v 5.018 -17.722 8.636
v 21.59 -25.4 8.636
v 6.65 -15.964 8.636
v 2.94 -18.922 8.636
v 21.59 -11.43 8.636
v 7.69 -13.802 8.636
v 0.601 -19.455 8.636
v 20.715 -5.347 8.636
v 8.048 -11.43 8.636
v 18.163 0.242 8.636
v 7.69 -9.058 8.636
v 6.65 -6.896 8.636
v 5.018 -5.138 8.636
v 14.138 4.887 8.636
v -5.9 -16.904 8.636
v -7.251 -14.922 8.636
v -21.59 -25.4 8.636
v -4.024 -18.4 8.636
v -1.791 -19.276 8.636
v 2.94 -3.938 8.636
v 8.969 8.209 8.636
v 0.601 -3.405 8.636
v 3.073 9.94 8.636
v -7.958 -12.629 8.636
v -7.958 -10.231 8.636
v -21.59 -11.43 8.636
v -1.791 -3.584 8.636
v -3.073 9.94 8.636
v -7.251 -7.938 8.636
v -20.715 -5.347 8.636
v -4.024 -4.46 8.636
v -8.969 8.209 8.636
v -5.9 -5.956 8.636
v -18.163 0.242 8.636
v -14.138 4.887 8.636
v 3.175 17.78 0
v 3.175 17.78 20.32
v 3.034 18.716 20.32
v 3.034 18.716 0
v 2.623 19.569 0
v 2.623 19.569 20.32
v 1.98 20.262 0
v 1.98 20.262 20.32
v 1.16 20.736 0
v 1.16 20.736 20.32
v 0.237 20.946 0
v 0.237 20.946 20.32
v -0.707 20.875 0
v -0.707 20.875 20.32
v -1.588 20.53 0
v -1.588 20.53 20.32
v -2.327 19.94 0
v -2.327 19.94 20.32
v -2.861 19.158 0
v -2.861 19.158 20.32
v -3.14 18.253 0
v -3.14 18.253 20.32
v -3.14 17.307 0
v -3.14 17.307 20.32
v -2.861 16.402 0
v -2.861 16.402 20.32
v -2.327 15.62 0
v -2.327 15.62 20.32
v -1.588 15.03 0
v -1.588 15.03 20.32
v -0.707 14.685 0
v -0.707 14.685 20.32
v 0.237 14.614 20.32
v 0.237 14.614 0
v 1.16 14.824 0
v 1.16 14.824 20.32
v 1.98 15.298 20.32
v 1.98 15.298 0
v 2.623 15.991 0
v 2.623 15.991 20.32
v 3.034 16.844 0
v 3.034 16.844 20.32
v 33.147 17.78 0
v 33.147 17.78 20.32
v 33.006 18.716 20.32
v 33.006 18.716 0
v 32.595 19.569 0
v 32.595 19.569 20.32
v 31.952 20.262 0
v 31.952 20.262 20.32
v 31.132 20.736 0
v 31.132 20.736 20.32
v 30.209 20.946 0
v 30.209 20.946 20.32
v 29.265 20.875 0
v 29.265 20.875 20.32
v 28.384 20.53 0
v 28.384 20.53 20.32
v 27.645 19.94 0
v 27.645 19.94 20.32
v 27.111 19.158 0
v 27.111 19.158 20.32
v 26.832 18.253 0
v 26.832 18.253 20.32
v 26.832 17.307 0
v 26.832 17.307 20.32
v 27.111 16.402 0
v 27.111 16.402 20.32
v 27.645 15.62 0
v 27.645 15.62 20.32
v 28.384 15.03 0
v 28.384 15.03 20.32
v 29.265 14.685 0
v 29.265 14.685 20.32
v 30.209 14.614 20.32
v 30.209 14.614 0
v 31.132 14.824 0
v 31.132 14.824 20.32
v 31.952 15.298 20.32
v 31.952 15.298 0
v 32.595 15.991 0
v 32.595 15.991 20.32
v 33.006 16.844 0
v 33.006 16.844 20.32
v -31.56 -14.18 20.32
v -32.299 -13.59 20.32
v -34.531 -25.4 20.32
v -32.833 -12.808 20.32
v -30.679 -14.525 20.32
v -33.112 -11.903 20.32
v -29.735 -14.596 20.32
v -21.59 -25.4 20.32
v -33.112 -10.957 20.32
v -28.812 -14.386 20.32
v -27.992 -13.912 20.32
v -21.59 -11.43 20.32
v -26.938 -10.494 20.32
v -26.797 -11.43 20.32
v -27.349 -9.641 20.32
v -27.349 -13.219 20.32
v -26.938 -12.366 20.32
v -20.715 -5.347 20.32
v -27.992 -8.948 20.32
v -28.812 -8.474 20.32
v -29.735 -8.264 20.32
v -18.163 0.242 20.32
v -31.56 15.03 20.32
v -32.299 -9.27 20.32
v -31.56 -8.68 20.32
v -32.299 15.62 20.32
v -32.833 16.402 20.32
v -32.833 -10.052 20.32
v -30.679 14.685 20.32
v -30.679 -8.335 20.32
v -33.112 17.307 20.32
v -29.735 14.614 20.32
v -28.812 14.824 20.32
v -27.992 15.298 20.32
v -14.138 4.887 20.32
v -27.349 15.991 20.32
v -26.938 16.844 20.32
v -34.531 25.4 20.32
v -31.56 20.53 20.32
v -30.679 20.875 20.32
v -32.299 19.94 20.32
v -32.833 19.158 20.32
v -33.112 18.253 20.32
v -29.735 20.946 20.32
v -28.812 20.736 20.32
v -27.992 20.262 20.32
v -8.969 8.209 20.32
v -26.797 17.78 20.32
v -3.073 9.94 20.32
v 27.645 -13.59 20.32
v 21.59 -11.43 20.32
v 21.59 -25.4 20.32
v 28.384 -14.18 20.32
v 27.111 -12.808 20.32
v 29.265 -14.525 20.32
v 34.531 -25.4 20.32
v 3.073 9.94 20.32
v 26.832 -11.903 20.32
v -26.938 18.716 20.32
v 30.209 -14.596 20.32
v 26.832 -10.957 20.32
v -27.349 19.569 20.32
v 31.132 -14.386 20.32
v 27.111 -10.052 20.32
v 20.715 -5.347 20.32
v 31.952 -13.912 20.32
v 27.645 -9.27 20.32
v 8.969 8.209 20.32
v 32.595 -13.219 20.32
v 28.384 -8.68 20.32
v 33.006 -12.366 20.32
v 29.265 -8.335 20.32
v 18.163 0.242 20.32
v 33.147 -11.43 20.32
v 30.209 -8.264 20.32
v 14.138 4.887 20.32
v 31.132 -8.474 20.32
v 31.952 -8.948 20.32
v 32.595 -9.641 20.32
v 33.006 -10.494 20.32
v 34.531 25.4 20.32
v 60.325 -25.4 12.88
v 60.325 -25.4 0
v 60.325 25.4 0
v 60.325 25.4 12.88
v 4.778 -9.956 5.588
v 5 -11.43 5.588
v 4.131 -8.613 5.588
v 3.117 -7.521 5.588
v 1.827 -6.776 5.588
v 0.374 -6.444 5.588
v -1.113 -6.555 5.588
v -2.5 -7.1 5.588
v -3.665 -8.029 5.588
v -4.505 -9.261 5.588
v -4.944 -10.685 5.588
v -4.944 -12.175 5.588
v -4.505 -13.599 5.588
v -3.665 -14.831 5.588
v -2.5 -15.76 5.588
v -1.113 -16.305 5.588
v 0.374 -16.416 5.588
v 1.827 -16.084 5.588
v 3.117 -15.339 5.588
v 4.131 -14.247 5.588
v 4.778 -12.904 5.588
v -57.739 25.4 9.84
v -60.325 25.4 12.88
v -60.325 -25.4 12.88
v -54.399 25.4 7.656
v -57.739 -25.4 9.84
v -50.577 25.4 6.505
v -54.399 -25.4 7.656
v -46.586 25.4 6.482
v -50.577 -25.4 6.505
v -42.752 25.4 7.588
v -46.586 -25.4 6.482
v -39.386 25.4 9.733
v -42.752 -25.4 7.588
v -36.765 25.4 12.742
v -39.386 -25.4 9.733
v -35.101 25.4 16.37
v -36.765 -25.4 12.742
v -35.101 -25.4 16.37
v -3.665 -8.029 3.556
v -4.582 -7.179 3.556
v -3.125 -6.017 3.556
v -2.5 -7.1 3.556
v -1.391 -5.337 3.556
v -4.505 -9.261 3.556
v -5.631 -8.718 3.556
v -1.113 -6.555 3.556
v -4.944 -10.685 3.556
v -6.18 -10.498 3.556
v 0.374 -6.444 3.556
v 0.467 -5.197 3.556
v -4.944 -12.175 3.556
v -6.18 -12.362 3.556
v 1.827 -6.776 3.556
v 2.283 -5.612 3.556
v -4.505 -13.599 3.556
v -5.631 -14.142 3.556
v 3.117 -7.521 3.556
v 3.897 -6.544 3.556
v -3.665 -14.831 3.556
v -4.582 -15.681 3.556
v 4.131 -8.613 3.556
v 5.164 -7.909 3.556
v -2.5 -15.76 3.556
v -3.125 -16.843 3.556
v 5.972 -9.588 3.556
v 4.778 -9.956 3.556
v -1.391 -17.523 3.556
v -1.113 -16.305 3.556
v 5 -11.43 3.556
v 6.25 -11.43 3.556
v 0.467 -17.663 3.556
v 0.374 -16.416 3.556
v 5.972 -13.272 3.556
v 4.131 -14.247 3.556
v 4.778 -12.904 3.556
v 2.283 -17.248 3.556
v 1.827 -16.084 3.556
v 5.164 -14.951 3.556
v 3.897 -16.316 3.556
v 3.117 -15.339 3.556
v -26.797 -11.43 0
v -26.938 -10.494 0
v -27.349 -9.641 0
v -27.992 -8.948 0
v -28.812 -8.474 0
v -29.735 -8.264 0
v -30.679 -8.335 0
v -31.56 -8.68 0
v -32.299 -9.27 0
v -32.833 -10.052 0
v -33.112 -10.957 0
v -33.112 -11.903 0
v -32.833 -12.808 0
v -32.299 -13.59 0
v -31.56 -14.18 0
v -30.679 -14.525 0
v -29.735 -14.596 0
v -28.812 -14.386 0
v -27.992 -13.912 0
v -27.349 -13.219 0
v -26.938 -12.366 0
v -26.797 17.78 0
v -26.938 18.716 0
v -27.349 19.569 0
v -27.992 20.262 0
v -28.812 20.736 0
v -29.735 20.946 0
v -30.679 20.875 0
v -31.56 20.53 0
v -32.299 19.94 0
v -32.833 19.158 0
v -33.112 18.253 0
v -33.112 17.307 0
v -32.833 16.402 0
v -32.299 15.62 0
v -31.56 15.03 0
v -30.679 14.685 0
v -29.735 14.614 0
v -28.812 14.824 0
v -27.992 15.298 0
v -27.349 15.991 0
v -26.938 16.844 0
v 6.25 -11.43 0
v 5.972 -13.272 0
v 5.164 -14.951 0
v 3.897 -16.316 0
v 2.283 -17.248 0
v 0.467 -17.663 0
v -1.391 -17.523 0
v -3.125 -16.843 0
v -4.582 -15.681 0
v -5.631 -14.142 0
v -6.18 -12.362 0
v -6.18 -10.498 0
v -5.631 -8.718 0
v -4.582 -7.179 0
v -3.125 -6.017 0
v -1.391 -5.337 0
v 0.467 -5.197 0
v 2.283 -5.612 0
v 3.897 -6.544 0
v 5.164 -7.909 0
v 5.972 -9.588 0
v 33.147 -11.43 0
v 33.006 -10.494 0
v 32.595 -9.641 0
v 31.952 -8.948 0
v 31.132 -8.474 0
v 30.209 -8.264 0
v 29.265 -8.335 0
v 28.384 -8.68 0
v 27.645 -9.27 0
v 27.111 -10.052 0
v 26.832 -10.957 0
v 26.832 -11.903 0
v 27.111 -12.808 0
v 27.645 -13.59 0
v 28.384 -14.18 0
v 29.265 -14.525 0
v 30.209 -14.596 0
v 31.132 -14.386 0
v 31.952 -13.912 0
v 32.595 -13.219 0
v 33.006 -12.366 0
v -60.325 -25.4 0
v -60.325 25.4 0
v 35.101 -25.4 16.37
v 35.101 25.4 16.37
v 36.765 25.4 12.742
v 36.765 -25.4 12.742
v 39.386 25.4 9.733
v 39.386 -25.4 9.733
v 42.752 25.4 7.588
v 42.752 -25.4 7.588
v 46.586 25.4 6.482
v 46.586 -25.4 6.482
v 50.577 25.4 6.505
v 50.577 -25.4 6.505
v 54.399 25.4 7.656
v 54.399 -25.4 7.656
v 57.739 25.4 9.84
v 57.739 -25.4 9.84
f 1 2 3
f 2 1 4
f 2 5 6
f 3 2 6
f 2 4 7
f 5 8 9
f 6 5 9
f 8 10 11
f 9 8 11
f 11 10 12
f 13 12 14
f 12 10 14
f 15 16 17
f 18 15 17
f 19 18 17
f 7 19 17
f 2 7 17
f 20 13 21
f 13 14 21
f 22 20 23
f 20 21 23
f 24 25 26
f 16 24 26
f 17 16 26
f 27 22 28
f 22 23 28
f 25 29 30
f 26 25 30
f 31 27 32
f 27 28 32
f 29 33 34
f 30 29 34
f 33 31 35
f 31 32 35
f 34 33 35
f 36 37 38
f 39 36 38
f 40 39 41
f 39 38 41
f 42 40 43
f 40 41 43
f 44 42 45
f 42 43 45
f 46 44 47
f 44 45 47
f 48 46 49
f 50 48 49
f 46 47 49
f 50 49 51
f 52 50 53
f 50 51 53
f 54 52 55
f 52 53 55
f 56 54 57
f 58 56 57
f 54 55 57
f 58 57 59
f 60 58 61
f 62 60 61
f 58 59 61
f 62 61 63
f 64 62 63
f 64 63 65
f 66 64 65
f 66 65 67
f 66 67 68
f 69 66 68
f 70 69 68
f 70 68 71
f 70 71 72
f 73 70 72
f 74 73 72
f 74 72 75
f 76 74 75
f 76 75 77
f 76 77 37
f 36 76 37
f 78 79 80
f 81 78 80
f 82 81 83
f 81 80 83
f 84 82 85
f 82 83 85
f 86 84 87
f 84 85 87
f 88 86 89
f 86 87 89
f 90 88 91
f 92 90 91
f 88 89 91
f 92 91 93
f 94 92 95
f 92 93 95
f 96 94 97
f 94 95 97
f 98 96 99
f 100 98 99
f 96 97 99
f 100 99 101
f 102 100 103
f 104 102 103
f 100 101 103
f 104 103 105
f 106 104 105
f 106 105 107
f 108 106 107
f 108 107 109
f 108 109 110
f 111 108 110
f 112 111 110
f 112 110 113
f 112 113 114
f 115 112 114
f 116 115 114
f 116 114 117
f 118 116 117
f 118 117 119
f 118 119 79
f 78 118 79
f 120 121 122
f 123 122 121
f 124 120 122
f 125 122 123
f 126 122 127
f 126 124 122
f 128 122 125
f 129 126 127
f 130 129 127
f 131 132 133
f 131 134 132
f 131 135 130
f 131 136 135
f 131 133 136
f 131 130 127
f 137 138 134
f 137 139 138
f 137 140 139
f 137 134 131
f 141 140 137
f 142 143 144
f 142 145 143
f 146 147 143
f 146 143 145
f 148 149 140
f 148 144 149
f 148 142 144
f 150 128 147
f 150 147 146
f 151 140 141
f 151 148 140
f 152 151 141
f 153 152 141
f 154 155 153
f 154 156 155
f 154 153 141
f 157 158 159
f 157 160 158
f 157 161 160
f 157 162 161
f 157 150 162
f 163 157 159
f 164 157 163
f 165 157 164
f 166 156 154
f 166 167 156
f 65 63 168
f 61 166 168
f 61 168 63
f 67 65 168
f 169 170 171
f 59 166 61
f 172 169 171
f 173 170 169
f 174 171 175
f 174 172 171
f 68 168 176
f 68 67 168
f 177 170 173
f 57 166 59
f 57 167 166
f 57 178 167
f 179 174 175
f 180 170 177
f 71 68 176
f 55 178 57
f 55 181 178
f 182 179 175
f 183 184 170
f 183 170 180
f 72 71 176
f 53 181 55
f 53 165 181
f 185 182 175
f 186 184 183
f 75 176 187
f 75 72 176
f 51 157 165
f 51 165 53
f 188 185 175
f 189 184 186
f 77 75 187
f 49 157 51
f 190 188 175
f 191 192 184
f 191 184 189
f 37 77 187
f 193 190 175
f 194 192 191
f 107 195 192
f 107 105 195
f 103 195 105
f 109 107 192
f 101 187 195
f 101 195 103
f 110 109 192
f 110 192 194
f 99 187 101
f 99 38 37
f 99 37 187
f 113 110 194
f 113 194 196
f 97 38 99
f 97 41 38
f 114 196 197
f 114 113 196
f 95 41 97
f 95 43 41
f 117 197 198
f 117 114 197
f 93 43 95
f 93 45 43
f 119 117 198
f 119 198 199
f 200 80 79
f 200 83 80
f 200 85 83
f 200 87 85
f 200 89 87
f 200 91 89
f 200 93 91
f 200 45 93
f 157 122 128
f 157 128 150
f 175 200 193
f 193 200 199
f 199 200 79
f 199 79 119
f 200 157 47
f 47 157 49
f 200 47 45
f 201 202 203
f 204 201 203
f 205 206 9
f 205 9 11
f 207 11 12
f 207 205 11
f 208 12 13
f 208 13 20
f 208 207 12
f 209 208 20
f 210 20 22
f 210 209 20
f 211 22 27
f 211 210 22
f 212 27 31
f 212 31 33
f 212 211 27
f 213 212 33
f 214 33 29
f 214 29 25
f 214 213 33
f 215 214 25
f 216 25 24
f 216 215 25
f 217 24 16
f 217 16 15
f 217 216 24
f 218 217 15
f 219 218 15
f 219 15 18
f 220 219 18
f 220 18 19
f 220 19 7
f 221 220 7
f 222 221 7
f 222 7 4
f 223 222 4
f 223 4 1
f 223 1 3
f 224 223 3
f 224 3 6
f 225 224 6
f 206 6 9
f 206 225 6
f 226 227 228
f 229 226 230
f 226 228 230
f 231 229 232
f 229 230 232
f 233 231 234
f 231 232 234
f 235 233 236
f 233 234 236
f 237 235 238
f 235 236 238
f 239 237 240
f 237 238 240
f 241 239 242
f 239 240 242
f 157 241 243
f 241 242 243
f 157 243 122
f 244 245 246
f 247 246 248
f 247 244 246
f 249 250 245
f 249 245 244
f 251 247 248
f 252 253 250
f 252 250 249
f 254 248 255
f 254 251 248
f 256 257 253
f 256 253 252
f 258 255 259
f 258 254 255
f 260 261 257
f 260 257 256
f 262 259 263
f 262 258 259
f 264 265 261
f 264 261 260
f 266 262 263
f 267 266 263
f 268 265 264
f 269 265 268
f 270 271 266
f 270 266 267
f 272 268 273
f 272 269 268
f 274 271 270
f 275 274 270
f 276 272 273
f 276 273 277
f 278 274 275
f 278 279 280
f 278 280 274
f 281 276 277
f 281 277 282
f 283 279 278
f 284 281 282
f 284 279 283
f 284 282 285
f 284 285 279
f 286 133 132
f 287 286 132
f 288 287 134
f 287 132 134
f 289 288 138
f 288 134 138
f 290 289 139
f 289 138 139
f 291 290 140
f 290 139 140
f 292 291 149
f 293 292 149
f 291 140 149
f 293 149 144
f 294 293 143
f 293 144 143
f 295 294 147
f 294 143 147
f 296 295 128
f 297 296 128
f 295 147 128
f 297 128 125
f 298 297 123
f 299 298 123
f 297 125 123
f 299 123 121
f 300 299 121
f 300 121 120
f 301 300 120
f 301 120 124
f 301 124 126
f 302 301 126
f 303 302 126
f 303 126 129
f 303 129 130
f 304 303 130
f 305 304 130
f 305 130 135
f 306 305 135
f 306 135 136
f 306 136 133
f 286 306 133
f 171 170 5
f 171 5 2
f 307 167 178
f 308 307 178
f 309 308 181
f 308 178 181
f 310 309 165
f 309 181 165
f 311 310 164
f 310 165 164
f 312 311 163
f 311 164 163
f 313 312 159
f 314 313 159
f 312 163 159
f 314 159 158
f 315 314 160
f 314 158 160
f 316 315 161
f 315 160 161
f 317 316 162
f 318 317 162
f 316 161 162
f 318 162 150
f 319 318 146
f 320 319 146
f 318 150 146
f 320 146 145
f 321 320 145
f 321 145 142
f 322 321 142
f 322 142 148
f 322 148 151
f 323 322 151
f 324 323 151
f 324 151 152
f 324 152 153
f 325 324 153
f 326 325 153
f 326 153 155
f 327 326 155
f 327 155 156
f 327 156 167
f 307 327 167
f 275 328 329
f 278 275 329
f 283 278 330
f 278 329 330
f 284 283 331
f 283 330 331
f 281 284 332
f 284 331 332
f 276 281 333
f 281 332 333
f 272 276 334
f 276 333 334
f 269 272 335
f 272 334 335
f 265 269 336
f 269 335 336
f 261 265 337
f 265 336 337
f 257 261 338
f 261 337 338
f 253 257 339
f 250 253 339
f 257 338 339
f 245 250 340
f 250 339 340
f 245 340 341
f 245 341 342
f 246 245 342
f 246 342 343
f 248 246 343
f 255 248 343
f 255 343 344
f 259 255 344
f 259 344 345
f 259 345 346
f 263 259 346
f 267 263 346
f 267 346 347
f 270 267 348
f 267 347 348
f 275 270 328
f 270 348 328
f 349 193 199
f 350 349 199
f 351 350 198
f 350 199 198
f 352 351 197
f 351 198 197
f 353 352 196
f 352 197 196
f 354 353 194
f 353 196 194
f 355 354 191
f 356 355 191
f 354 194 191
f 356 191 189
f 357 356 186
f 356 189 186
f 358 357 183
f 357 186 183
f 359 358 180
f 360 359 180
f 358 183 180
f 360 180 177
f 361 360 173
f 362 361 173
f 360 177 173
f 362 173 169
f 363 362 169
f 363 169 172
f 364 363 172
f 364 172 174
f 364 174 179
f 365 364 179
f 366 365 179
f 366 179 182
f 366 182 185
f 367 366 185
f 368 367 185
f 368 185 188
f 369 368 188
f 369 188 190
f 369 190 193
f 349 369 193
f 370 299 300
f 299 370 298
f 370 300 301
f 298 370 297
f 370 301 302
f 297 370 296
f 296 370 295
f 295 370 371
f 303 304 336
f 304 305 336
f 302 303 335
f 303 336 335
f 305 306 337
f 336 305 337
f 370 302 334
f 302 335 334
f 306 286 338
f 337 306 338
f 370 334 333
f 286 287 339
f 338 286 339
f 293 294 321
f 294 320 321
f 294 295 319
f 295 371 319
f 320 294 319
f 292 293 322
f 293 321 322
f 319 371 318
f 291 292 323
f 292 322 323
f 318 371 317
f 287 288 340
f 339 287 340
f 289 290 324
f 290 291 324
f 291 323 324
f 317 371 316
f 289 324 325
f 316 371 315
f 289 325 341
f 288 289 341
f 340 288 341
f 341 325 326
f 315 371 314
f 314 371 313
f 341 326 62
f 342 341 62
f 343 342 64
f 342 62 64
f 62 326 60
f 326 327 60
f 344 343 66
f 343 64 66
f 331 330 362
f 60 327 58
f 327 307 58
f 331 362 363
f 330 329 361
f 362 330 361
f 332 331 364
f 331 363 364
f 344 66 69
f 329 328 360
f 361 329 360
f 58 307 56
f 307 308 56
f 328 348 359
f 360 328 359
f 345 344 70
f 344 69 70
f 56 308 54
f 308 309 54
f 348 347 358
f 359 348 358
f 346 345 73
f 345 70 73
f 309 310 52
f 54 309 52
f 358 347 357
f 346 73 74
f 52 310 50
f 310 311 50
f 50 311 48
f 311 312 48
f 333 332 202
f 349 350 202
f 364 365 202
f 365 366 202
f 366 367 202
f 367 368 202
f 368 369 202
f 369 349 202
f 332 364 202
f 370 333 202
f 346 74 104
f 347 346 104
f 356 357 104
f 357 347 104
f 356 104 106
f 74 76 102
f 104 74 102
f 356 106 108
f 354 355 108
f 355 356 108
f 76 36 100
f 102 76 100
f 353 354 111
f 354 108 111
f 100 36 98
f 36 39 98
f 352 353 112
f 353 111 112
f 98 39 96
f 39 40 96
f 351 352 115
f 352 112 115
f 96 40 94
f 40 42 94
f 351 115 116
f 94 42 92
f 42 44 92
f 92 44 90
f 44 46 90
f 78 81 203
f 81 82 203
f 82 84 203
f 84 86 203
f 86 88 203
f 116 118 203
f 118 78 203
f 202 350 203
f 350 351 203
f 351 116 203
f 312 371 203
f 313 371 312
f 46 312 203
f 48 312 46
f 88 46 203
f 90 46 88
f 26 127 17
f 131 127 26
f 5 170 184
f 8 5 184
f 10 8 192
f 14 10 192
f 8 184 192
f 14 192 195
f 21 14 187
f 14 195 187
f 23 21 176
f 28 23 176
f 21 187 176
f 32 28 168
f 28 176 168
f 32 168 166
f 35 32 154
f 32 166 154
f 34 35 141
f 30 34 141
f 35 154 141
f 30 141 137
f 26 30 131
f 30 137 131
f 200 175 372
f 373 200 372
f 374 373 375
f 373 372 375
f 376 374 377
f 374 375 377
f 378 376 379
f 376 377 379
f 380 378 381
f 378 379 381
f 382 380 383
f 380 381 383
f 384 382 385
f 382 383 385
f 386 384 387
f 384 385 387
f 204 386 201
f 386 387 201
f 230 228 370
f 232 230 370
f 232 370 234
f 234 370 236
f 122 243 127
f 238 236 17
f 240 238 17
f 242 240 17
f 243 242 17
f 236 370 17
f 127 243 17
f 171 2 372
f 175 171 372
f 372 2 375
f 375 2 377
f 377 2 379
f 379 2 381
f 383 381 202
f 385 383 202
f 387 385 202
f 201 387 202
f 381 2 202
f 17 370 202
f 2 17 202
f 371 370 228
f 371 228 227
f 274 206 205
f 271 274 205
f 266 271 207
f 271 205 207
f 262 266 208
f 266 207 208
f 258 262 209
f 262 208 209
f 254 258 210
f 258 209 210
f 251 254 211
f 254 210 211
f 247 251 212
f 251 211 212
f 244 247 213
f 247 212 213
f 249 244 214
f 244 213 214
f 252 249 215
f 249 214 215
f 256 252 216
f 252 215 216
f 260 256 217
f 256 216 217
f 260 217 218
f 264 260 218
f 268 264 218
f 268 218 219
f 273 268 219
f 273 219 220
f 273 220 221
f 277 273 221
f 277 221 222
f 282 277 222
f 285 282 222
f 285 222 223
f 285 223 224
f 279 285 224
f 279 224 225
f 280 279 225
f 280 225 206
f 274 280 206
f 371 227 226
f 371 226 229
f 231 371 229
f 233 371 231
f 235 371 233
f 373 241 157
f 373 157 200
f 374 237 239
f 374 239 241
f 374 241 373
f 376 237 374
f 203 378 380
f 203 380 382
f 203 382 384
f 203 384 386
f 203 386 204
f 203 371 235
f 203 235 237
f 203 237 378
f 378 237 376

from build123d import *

# Parameters (mm, degrees)
SKETCH_W        = 120.65
SKETCH_H        = 50.8
PAD_DEPTH       = 20.32
POCKET_DEPTH    = 11.684
SKETCH002_R     = 13.97
POCKET001_DEPTH = 50.801
SKETCH003_R     = 3.175
SKETCH003_R_2   = 5
POCKET002_DEPTH = 20.321
SKETCH004_R     = 6.25
POCKET003_DEPTH = 3.556
CHAMFER_SIZE    = 3.048


with BuildPart() as part:
    # Sketch → Pad (new body)
    with BuildSketch(Plane.XY):
        Rectangle(SKETCH_W, SKETCH_H)
    extrude(amount=PAD_DEPTH)

    # Sketch001 (on Face6 of Pad) → Pocket (cut)
    with BuildSketch(Plane.XY.offset(20.32)):
        with BuildLine():
            Line((21.59, -11.43), (21.59, -25.4))
            Line((21.59, -25.4), (-21.59, -25.4))
            Line((-21.59, -25.4), (-21.59, -11.43))
            ThreePointArc((21.59, -11.43), (0, 10.16), (-21.59, -11.43))
        make_face()
    extrude(amount=-POCKET_DEPTH, mode=Mode.SUBTRACT)

    # Sketch002 (on Face6 of Pocket) → Pocket001 (cut, through all)
    with BuildSketch(Plane.XZ.offset(25.4)):
        with Locations((48.5013, 20.32)):
            Circle(SKETCH002_R)
        with Locations((-48.5013, 20.32)):
            Circle(SKETCH002_R)
    extrude(amount=-POCKET001_DEPTH, mode=Mode.SUBTRACT)

    # Sketch003 (on Face5 of Pocket001) → Pocket002 (cut, through all)
    with BuildSketch(Plane.XY.offset(20.32)):
        with Locations((-29.972, 17.78)):
            Circle(SKETCH003_R)
        with Locations((0, 17.78)):
            Circle(SKETCH003_R)
        with Locations((29.972, 17.78)):
            Circle(SKETCH003_R)
        with Locations((-29.972, -11.43)):
            Circle(SKETCH003_R)
        with Locations((0, -11.43)):
            Circle(SKETCH003_R_2)
        with Locations((29.972, -11.43)):
            Circle(SKETCH003_R)
    extrude(amount=-POCKET002_DEPTH, mode=Mode.SUBTRACT)

    # Sketch004 (on Face2 of Pocket002) → Pocket003 (cut)
    with BuildSketch(Plane(origin=(0, 0, 0), x_dir=(1, 0, 0), z_dir=(0, 0, -1))):
        with Locations((0, 11.43)):
            Circle(SKETCH004_R)
    extrude(amount=-POCKET003_DEPTH, mode=Mode.SUBTRACT)

    # Chamfer
    chamfer_edges = [part.edges().sort_by_distance(p)[0] for p in [
        (-5, -11.43, 8.636),
    ]]
    chamfer(chamfer_edges, length=CHAMFER_SIZE)


solid = part.part
